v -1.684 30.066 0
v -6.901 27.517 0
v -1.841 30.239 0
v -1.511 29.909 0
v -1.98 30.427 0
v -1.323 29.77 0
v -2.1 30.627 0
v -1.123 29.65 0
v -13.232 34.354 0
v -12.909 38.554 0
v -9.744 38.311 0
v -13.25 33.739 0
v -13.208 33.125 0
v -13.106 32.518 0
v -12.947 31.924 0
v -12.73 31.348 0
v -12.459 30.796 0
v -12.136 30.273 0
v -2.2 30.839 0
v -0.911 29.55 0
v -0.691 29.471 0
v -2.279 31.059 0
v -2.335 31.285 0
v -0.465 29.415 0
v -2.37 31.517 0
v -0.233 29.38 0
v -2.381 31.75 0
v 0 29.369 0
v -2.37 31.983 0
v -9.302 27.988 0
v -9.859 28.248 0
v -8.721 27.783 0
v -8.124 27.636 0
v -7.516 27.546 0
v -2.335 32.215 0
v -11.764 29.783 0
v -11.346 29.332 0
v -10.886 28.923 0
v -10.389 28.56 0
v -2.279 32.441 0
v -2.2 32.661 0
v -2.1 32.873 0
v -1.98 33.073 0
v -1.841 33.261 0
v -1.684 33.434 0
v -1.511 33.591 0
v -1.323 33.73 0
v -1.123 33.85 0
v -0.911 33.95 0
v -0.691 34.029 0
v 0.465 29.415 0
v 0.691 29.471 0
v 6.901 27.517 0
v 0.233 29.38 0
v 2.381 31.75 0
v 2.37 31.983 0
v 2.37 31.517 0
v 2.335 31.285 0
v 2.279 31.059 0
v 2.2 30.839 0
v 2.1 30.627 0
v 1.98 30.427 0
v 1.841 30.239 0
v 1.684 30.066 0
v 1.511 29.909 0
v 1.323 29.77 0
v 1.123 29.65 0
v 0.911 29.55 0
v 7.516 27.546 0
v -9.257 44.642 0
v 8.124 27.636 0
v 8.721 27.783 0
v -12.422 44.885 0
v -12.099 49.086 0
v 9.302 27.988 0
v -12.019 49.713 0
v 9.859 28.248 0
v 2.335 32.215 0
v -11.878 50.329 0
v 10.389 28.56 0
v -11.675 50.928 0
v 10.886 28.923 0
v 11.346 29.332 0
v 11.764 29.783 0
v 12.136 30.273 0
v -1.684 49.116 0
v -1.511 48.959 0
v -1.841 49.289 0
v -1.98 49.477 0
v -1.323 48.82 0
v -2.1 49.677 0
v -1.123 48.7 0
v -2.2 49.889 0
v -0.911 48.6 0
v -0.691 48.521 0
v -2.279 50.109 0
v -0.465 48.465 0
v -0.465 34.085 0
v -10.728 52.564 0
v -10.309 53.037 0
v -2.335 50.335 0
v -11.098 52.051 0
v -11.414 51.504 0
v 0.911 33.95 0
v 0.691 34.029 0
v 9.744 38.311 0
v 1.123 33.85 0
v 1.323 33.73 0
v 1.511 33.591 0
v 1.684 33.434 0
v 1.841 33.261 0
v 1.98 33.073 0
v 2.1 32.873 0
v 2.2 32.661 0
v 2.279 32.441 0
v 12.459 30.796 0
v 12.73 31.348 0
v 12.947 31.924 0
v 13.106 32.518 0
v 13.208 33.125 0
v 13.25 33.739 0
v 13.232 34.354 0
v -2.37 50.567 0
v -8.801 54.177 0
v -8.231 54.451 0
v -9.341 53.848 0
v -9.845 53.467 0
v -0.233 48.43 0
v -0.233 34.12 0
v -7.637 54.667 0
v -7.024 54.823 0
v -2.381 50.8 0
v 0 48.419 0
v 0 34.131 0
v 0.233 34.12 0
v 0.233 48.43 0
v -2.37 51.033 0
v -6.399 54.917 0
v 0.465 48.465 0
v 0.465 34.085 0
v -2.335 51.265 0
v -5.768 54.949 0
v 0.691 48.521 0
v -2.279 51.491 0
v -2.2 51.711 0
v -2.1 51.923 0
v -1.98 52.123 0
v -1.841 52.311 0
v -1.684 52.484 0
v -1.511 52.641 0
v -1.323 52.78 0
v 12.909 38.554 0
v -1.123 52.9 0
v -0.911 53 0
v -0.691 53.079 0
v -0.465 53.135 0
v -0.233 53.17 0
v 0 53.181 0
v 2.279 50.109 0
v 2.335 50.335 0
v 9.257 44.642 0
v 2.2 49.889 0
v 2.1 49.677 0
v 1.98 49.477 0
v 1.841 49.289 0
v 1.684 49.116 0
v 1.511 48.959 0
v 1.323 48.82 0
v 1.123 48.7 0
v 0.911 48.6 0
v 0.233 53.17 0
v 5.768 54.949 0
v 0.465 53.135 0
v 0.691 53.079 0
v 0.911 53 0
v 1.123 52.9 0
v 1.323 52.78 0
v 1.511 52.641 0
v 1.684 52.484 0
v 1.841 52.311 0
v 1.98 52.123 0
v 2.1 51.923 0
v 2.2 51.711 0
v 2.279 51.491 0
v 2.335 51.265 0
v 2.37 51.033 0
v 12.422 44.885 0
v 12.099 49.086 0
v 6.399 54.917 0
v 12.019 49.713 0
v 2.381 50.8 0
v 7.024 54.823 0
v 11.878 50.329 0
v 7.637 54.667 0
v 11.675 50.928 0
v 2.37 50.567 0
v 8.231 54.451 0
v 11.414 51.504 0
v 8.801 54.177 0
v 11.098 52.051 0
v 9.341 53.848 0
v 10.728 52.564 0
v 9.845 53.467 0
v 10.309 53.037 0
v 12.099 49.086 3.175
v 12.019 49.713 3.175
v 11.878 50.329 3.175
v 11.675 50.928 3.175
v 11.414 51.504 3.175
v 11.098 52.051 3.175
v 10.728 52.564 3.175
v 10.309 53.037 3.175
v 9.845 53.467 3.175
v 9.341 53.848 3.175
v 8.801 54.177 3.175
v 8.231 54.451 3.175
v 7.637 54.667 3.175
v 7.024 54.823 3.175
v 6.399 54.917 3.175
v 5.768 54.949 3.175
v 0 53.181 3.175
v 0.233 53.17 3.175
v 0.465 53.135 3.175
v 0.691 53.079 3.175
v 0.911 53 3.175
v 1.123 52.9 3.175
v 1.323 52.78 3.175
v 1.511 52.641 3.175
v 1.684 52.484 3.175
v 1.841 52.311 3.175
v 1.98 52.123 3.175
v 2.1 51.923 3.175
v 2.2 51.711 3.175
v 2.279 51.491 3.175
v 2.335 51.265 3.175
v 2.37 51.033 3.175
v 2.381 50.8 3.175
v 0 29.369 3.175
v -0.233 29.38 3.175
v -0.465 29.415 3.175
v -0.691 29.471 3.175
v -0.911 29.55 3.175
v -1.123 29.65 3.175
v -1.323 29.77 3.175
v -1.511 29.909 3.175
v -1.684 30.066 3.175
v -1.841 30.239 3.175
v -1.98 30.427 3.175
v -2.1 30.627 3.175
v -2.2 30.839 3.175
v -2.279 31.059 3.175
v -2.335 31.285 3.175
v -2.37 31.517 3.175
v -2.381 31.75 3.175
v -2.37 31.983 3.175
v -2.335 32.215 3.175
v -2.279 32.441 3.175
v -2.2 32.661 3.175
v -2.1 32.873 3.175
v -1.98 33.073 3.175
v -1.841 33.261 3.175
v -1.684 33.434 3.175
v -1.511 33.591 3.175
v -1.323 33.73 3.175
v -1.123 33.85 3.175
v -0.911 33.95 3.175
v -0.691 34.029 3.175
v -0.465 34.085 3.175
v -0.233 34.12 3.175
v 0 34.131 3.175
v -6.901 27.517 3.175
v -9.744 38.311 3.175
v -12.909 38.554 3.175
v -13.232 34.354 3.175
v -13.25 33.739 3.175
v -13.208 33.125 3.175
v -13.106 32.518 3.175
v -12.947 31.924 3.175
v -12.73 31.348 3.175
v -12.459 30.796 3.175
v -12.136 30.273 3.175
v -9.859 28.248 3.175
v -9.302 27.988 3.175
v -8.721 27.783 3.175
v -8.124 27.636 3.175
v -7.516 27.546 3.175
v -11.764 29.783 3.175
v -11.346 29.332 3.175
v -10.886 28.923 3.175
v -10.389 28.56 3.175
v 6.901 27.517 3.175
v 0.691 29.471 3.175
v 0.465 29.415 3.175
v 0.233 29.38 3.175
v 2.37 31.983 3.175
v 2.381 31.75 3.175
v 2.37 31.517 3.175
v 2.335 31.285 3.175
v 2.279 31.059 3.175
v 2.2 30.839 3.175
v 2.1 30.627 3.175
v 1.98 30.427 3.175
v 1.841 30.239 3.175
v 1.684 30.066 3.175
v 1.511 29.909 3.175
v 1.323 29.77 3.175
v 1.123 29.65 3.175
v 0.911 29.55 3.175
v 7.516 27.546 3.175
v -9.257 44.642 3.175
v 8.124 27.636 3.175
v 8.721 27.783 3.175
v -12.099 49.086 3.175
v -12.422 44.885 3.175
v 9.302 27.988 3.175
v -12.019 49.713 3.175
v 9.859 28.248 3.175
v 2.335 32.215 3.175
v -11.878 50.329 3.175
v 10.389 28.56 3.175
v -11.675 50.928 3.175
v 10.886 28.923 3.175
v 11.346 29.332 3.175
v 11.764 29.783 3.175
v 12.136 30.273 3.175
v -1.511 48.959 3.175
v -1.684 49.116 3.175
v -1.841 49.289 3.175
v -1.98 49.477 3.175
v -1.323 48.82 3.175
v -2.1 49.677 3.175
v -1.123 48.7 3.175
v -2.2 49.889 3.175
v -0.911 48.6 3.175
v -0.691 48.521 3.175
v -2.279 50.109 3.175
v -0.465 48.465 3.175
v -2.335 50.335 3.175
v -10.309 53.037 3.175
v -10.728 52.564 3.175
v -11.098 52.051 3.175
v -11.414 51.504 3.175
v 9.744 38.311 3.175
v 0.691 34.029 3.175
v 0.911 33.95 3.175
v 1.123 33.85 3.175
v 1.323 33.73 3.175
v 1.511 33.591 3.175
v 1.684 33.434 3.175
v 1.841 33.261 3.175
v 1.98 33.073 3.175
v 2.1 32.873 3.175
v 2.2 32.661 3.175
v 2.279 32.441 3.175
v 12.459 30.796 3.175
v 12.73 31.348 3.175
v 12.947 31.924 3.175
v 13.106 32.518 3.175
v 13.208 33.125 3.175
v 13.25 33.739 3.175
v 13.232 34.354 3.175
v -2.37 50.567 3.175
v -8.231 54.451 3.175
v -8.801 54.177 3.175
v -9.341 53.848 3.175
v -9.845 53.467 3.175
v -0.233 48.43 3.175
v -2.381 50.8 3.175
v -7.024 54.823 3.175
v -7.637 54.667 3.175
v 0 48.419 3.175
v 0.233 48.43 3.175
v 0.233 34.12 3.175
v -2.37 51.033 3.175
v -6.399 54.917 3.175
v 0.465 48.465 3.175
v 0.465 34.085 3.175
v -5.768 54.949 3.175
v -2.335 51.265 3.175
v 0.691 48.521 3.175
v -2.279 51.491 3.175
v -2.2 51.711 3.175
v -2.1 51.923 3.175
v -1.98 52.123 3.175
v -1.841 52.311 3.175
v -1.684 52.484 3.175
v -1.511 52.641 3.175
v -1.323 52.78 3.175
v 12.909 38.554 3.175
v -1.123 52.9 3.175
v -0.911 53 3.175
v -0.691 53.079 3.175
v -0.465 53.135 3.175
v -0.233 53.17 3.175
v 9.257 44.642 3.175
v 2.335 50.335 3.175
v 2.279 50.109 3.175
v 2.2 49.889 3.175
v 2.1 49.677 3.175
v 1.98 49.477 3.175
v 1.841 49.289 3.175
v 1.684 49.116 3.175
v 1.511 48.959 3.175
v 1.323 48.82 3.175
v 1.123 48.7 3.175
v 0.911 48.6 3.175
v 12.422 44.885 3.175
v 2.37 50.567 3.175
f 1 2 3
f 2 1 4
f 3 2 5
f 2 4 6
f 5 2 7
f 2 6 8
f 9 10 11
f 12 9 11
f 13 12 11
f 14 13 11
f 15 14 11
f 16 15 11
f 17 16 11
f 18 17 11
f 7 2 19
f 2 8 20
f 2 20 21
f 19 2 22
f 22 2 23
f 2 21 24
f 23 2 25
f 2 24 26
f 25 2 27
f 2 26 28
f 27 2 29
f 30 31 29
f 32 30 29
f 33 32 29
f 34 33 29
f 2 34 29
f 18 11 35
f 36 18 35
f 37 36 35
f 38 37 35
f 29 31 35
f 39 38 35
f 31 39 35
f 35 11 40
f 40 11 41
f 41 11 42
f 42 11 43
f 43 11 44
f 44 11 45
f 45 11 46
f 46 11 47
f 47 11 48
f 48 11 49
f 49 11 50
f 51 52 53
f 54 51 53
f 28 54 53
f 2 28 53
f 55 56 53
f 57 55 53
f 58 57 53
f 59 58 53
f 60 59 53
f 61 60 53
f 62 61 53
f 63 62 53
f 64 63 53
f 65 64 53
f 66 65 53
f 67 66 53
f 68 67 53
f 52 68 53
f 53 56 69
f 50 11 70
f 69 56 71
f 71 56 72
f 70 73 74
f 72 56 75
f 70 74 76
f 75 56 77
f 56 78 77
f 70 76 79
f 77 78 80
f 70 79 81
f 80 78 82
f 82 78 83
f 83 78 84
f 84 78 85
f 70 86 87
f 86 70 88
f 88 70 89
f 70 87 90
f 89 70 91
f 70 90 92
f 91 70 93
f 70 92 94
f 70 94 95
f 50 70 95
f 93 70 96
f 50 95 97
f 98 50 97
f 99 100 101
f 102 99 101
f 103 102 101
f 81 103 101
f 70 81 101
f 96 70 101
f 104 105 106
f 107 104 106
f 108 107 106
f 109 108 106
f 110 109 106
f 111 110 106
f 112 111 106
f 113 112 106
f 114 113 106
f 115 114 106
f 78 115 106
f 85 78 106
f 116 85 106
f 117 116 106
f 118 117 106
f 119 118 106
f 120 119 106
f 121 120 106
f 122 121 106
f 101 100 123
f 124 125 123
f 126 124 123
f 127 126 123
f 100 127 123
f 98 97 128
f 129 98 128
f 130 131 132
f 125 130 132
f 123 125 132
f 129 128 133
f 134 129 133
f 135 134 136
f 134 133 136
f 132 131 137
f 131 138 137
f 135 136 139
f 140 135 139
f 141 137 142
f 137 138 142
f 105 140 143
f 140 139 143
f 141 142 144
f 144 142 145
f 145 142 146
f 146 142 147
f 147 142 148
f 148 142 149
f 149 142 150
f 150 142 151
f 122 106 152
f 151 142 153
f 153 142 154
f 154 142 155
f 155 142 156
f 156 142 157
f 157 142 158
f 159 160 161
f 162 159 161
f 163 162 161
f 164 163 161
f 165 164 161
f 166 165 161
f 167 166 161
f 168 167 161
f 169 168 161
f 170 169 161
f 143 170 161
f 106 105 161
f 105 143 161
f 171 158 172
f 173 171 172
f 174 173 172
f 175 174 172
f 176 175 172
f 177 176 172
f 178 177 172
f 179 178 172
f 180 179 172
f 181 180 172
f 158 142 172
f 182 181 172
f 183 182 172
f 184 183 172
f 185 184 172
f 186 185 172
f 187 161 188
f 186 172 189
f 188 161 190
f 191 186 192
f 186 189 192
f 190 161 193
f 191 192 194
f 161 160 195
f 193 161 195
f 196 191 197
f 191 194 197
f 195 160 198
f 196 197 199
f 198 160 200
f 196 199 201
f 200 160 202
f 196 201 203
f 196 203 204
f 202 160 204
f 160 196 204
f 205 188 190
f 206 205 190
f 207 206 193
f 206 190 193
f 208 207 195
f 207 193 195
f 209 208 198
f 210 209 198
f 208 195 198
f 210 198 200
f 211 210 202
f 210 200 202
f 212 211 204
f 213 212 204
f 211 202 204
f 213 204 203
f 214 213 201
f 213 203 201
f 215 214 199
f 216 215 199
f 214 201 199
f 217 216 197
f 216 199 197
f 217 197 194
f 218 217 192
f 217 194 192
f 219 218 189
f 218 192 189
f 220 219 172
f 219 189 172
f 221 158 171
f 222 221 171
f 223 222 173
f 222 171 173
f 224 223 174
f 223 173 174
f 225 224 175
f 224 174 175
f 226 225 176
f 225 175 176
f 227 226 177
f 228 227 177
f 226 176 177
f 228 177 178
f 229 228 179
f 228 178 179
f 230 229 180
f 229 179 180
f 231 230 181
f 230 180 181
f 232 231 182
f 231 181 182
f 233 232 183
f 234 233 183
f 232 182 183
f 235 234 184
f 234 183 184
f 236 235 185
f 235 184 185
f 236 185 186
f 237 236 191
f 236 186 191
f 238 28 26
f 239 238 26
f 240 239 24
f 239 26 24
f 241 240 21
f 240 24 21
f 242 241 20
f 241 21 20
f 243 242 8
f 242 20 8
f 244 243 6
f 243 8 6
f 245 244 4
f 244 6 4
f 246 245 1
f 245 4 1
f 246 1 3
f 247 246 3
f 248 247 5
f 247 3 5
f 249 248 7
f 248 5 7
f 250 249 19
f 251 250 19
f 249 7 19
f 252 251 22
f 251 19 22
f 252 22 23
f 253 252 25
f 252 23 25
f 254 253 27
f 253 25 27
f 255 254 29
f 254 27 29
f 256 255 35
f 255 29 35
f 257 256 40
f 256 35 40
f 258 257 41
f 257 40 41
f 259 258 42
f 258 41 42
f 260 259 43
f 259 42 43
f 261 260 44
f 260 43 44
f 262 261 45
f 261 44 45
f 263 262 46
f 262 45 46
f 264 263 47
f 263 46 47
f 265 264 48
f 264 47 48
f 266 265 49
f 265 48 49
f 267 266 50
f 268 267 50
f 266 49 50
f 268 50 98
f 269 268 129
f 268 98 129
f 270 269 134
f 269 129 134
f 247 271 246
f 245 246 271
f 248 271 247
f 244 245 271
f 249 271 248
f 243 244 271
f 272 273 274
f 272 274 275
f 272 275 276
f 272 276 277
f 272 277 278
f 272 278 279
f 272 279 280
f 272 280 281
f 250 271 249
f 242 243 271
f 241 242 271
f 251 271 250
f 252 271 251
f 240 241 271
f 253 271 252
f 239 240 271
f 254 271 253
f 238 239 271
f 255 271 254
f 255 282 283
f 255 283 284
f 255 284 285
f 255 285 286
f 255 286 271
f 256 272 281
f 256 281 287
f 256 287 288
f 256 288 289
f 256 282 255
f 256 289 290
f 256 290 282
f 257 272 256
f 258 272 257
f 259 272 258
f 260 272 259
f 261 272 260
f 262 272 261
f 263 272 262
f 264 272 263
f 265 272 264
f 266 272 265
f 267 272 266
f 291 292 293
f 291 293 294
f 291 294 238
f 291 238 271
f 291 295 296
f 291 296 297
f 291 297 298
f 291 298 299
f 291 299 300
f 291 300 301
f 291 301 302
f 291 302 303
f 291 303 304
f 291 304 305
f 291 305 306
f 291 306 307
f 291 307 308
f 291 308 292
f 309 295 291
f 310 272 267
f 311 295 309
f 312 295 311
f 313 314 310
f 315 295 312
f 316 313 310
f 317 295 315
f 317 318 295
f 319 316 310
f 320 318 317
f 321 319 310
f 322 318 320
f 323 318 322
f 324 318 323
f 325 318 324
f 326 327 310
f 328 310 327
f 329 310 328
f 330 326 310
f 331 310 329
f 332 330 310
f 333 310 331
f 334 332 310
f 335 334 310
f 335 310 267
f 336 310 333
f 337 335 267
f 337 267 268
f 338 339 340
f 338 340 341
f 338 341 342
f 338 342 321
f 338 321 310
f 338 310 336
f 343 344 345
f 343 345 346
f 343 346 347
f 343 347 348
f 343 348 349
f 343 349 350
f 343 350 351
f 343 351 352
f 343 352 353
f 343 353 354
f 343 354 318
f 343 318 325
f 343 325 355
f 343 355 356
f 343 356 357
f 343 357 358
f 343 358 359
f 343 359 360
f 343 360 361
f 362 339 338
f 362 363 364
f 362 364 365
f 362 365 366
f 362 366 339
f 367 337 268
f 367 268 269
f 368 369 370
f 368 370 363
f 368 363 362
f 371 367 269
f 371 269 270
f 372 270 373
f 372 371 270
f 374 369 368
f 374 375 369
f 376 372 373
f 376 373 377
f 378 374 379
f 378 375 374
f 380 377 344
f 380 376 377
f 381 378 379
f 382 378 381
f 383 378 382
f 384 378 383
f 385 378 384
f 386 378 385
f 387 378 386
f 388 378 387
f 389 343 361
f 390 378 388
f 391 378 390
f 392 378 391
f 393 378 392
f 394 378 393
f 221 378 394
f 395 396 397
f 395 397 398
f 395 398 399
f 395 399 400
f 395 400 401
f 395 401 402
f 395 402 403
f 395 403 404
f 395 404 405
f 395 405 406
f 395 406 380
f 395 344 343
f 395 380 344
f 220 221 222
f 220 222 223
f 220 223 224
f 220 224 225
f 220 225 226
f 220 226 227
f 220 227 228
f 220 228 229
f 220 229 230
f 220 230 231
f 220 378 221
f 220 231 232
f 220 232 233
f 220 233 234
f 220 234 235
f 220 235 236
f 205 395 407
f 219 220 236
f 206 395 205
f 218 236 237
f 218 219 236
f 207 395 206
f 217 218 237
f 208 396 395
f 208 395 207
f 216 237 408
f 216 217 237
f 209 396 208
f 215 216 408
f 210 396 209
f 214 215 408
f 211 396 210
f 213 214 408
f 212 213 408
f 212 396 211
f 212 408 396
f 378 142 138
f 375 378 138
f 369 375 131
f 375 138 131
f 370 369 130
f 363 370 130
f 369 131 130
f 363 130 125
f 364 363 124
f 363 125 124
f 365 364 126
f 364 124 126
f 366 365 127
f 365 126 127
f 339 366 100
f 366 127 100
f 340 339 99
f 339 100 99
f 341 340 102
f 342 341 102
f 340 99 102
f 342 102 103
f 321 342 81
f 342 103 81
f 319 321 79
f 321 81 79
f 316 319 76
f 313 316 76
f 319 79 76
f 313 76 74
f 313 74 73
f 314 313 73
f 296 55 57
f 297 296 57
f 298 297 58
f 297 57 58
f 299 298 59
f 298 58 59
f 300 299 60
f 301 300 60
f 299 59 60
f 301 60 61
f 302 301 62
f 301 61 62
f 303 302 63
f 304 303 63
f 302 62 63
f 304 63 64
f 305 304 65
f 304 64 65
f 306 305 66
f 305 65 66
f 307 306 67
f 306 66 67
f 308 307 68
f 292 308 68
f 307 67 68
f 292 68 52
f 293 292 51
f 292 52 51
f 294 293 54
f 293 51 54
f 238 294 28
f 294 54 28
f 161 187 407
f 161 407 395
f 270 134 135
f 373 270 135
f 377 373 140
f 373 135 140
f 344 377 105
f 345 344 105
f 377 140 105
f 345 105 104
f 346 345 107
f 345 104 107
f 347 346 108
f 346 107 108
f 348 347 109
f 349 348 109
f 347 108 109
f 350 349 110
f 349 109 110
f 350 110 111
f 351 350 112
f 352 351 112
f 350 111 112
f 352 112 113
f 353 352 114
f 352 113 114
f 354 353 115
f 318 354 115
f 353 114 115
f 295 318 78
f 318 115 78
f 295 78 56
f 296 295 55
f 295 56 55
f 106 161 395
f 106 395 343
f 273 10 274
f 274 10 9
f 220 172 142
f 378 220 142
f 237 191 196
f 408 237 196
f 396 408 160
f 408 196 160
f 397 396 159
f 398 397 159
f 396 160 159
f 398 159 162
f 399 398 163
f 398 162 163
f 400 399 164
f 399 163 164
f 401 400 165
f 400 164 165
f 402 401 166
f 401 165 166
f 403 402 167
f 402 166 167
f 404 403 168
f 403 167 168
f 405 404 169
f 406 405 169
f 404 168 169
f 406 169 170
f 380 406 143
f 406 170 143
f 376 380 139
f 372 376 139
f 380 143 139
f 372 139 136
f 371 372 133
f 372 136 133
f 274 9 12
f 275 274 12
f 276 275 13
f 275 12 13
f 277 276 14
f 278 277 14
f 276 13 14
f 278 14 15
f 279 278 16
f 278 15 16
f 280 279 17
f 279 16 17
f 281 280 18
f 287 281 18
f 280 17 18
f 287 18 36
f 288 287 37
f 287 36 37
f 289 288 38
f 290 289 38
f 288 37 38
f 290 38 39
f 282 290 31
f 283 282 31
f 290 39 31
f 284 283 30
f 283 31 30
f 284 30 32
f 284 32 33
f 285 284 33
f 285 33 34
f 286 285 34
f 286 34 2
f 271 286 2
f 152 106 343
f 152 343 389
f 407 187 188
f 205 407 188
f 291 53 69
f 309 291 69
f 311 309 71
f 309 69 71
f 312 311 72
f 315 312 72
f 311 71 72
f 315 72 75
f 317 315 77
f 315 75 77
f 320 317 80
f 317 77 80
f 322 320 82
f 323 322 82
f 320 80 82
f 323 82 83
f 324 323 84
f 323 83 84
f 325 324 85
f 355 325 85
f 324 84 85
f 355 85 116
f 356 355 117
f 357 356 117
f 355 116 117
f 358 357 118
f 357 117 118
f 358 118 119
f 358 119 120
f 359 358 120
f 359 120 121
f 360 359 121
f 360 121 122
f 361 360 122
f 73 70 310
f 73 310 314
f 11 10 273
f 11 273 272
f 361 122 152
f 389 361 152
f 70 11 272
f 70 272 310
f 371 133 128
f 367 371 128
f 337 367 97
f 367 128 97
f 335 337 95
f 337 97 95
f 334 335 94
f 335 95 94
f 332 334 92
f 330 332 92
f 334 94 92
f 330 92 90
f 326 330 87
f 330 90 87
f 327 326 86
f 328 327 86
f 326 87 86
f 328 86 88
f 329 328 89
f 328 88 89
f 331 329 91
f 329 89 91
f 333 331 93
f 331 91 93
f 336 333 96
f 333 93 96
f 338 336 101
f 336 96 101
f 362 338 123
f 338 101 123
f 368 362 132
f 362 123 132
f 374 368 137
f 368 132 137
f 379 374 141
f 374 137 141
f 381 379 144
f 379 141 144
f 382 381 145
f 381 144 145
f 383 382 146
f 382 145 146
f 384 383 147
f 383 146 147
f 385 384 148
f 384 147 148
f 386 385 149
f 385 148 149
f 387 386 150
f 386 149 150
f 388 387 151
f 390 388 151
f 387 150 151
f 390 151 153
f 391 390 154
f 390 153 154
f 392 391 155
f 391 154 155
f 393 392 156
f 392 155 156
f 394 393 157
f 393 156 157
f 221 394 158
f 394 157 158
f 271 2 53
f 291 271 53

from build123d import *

# Parameters (mm, degrees)
BOSS_EXTRUDE1_DEPTH = 3.175
CAVITY1_DEPTH       = 3.175


# Read off the part's stored shape, not the designer's step: Cavity1
with BuildPart() as part:
    # Sketch1 → Boss-Extrude1 (new body)
    with BuildSketch(Plane.XY):
        with BuildLine():
            Line((-6.901112522, 27.516666667), (0, 27.516666667))
            Line((0, 27.516666667), (0, 29.368749958))
            ThreePointArc((0, 29.368749958), (-2.38125, 31.749999958), (0, 34.131249958))
            Line((0, 34.131249958), (0, 48.418749958))
            ThreePointArc((0, 48.418749958), (-2.38125, 50.799999958), (0, 53.181249958))
            Line((0, 53.181249958), (0, 54.948666667))
            Line((0, 54.948666667), (-5.767881753, 54.948666667))
            ThreePointArc((-5.767881753, 54.948666667), (-10.082386674, 53.257802562), (-12.099177736, 49.085689435))
            Line((-12.099177736, 49.085689435), (-13.232408505, 34.353689435))
            ThreePointArc((-13.232408505, 34.353689435), (-11.560248417, 29.552161746), (-6.901112522, 27.516666667))
        make_face()
        with BuildLine():
            Line((0, 29.368749958), (0, 27.516666667))
            Line((0, 27.516666667), (6.901112522, 27.516666667))
            ThreePointArc((6.901112522, 27.516666667), (11.560248417, 29.552161746), (13.232408505, 34.353689435))
            Line((13.232408505, 34.353689435), (12.099177736, 49.085689435))
            ThreePointArc((12.099177736, 49.085689435), (10.082386674, 53.257802562), (5.767881753, 54.948666667))
            Line((5.767881753, 54.948666667), (0, 54.948666667))
            Line((0, 54.948666667), (0, 53.181249958))
            ThreePointArc((0, 53.181249958), (1.683798023, 52.48379798), (2.38125, 50.799999958))
            ThreePointArc((2.38125, 50.799999958), (1.683798023, 49.116201935), (0, 48.418749958))
            Line((0, 48.418749958), (0, 34.131249958))
            ThreePointArc((0, 34.131249958), (1.683798023, 33.43379798), (2.38125, 31.749999958))
            ThreePointArc((2.38125, 31.749999958), (1.683798023, 30.066201935), (0, 29.368749958))
        make_face()
    extrude(amount=BOSS_EXTRUDE1_DEPTH)

    # Cavity1 outline → Cavity1 (cut)
    with BuildSketch(Plane.XY):
        Polygon((9.256633745, 44.641826042), (9.743656513, 38.310530059), (12.909304504, 38.554041443), (12.422281737, 44.885337426), align=None)
        Polygon((-12.909304504, 38.554041443), (-9.743656513, 38.310530059), (-9.256633745, 44.641826042), (-12.422281736, 44.885337426), align=None)
    extrude(amount=CAVITY1_DEPTH, mode=Mode.SUBTRACT)


solid = part.part
